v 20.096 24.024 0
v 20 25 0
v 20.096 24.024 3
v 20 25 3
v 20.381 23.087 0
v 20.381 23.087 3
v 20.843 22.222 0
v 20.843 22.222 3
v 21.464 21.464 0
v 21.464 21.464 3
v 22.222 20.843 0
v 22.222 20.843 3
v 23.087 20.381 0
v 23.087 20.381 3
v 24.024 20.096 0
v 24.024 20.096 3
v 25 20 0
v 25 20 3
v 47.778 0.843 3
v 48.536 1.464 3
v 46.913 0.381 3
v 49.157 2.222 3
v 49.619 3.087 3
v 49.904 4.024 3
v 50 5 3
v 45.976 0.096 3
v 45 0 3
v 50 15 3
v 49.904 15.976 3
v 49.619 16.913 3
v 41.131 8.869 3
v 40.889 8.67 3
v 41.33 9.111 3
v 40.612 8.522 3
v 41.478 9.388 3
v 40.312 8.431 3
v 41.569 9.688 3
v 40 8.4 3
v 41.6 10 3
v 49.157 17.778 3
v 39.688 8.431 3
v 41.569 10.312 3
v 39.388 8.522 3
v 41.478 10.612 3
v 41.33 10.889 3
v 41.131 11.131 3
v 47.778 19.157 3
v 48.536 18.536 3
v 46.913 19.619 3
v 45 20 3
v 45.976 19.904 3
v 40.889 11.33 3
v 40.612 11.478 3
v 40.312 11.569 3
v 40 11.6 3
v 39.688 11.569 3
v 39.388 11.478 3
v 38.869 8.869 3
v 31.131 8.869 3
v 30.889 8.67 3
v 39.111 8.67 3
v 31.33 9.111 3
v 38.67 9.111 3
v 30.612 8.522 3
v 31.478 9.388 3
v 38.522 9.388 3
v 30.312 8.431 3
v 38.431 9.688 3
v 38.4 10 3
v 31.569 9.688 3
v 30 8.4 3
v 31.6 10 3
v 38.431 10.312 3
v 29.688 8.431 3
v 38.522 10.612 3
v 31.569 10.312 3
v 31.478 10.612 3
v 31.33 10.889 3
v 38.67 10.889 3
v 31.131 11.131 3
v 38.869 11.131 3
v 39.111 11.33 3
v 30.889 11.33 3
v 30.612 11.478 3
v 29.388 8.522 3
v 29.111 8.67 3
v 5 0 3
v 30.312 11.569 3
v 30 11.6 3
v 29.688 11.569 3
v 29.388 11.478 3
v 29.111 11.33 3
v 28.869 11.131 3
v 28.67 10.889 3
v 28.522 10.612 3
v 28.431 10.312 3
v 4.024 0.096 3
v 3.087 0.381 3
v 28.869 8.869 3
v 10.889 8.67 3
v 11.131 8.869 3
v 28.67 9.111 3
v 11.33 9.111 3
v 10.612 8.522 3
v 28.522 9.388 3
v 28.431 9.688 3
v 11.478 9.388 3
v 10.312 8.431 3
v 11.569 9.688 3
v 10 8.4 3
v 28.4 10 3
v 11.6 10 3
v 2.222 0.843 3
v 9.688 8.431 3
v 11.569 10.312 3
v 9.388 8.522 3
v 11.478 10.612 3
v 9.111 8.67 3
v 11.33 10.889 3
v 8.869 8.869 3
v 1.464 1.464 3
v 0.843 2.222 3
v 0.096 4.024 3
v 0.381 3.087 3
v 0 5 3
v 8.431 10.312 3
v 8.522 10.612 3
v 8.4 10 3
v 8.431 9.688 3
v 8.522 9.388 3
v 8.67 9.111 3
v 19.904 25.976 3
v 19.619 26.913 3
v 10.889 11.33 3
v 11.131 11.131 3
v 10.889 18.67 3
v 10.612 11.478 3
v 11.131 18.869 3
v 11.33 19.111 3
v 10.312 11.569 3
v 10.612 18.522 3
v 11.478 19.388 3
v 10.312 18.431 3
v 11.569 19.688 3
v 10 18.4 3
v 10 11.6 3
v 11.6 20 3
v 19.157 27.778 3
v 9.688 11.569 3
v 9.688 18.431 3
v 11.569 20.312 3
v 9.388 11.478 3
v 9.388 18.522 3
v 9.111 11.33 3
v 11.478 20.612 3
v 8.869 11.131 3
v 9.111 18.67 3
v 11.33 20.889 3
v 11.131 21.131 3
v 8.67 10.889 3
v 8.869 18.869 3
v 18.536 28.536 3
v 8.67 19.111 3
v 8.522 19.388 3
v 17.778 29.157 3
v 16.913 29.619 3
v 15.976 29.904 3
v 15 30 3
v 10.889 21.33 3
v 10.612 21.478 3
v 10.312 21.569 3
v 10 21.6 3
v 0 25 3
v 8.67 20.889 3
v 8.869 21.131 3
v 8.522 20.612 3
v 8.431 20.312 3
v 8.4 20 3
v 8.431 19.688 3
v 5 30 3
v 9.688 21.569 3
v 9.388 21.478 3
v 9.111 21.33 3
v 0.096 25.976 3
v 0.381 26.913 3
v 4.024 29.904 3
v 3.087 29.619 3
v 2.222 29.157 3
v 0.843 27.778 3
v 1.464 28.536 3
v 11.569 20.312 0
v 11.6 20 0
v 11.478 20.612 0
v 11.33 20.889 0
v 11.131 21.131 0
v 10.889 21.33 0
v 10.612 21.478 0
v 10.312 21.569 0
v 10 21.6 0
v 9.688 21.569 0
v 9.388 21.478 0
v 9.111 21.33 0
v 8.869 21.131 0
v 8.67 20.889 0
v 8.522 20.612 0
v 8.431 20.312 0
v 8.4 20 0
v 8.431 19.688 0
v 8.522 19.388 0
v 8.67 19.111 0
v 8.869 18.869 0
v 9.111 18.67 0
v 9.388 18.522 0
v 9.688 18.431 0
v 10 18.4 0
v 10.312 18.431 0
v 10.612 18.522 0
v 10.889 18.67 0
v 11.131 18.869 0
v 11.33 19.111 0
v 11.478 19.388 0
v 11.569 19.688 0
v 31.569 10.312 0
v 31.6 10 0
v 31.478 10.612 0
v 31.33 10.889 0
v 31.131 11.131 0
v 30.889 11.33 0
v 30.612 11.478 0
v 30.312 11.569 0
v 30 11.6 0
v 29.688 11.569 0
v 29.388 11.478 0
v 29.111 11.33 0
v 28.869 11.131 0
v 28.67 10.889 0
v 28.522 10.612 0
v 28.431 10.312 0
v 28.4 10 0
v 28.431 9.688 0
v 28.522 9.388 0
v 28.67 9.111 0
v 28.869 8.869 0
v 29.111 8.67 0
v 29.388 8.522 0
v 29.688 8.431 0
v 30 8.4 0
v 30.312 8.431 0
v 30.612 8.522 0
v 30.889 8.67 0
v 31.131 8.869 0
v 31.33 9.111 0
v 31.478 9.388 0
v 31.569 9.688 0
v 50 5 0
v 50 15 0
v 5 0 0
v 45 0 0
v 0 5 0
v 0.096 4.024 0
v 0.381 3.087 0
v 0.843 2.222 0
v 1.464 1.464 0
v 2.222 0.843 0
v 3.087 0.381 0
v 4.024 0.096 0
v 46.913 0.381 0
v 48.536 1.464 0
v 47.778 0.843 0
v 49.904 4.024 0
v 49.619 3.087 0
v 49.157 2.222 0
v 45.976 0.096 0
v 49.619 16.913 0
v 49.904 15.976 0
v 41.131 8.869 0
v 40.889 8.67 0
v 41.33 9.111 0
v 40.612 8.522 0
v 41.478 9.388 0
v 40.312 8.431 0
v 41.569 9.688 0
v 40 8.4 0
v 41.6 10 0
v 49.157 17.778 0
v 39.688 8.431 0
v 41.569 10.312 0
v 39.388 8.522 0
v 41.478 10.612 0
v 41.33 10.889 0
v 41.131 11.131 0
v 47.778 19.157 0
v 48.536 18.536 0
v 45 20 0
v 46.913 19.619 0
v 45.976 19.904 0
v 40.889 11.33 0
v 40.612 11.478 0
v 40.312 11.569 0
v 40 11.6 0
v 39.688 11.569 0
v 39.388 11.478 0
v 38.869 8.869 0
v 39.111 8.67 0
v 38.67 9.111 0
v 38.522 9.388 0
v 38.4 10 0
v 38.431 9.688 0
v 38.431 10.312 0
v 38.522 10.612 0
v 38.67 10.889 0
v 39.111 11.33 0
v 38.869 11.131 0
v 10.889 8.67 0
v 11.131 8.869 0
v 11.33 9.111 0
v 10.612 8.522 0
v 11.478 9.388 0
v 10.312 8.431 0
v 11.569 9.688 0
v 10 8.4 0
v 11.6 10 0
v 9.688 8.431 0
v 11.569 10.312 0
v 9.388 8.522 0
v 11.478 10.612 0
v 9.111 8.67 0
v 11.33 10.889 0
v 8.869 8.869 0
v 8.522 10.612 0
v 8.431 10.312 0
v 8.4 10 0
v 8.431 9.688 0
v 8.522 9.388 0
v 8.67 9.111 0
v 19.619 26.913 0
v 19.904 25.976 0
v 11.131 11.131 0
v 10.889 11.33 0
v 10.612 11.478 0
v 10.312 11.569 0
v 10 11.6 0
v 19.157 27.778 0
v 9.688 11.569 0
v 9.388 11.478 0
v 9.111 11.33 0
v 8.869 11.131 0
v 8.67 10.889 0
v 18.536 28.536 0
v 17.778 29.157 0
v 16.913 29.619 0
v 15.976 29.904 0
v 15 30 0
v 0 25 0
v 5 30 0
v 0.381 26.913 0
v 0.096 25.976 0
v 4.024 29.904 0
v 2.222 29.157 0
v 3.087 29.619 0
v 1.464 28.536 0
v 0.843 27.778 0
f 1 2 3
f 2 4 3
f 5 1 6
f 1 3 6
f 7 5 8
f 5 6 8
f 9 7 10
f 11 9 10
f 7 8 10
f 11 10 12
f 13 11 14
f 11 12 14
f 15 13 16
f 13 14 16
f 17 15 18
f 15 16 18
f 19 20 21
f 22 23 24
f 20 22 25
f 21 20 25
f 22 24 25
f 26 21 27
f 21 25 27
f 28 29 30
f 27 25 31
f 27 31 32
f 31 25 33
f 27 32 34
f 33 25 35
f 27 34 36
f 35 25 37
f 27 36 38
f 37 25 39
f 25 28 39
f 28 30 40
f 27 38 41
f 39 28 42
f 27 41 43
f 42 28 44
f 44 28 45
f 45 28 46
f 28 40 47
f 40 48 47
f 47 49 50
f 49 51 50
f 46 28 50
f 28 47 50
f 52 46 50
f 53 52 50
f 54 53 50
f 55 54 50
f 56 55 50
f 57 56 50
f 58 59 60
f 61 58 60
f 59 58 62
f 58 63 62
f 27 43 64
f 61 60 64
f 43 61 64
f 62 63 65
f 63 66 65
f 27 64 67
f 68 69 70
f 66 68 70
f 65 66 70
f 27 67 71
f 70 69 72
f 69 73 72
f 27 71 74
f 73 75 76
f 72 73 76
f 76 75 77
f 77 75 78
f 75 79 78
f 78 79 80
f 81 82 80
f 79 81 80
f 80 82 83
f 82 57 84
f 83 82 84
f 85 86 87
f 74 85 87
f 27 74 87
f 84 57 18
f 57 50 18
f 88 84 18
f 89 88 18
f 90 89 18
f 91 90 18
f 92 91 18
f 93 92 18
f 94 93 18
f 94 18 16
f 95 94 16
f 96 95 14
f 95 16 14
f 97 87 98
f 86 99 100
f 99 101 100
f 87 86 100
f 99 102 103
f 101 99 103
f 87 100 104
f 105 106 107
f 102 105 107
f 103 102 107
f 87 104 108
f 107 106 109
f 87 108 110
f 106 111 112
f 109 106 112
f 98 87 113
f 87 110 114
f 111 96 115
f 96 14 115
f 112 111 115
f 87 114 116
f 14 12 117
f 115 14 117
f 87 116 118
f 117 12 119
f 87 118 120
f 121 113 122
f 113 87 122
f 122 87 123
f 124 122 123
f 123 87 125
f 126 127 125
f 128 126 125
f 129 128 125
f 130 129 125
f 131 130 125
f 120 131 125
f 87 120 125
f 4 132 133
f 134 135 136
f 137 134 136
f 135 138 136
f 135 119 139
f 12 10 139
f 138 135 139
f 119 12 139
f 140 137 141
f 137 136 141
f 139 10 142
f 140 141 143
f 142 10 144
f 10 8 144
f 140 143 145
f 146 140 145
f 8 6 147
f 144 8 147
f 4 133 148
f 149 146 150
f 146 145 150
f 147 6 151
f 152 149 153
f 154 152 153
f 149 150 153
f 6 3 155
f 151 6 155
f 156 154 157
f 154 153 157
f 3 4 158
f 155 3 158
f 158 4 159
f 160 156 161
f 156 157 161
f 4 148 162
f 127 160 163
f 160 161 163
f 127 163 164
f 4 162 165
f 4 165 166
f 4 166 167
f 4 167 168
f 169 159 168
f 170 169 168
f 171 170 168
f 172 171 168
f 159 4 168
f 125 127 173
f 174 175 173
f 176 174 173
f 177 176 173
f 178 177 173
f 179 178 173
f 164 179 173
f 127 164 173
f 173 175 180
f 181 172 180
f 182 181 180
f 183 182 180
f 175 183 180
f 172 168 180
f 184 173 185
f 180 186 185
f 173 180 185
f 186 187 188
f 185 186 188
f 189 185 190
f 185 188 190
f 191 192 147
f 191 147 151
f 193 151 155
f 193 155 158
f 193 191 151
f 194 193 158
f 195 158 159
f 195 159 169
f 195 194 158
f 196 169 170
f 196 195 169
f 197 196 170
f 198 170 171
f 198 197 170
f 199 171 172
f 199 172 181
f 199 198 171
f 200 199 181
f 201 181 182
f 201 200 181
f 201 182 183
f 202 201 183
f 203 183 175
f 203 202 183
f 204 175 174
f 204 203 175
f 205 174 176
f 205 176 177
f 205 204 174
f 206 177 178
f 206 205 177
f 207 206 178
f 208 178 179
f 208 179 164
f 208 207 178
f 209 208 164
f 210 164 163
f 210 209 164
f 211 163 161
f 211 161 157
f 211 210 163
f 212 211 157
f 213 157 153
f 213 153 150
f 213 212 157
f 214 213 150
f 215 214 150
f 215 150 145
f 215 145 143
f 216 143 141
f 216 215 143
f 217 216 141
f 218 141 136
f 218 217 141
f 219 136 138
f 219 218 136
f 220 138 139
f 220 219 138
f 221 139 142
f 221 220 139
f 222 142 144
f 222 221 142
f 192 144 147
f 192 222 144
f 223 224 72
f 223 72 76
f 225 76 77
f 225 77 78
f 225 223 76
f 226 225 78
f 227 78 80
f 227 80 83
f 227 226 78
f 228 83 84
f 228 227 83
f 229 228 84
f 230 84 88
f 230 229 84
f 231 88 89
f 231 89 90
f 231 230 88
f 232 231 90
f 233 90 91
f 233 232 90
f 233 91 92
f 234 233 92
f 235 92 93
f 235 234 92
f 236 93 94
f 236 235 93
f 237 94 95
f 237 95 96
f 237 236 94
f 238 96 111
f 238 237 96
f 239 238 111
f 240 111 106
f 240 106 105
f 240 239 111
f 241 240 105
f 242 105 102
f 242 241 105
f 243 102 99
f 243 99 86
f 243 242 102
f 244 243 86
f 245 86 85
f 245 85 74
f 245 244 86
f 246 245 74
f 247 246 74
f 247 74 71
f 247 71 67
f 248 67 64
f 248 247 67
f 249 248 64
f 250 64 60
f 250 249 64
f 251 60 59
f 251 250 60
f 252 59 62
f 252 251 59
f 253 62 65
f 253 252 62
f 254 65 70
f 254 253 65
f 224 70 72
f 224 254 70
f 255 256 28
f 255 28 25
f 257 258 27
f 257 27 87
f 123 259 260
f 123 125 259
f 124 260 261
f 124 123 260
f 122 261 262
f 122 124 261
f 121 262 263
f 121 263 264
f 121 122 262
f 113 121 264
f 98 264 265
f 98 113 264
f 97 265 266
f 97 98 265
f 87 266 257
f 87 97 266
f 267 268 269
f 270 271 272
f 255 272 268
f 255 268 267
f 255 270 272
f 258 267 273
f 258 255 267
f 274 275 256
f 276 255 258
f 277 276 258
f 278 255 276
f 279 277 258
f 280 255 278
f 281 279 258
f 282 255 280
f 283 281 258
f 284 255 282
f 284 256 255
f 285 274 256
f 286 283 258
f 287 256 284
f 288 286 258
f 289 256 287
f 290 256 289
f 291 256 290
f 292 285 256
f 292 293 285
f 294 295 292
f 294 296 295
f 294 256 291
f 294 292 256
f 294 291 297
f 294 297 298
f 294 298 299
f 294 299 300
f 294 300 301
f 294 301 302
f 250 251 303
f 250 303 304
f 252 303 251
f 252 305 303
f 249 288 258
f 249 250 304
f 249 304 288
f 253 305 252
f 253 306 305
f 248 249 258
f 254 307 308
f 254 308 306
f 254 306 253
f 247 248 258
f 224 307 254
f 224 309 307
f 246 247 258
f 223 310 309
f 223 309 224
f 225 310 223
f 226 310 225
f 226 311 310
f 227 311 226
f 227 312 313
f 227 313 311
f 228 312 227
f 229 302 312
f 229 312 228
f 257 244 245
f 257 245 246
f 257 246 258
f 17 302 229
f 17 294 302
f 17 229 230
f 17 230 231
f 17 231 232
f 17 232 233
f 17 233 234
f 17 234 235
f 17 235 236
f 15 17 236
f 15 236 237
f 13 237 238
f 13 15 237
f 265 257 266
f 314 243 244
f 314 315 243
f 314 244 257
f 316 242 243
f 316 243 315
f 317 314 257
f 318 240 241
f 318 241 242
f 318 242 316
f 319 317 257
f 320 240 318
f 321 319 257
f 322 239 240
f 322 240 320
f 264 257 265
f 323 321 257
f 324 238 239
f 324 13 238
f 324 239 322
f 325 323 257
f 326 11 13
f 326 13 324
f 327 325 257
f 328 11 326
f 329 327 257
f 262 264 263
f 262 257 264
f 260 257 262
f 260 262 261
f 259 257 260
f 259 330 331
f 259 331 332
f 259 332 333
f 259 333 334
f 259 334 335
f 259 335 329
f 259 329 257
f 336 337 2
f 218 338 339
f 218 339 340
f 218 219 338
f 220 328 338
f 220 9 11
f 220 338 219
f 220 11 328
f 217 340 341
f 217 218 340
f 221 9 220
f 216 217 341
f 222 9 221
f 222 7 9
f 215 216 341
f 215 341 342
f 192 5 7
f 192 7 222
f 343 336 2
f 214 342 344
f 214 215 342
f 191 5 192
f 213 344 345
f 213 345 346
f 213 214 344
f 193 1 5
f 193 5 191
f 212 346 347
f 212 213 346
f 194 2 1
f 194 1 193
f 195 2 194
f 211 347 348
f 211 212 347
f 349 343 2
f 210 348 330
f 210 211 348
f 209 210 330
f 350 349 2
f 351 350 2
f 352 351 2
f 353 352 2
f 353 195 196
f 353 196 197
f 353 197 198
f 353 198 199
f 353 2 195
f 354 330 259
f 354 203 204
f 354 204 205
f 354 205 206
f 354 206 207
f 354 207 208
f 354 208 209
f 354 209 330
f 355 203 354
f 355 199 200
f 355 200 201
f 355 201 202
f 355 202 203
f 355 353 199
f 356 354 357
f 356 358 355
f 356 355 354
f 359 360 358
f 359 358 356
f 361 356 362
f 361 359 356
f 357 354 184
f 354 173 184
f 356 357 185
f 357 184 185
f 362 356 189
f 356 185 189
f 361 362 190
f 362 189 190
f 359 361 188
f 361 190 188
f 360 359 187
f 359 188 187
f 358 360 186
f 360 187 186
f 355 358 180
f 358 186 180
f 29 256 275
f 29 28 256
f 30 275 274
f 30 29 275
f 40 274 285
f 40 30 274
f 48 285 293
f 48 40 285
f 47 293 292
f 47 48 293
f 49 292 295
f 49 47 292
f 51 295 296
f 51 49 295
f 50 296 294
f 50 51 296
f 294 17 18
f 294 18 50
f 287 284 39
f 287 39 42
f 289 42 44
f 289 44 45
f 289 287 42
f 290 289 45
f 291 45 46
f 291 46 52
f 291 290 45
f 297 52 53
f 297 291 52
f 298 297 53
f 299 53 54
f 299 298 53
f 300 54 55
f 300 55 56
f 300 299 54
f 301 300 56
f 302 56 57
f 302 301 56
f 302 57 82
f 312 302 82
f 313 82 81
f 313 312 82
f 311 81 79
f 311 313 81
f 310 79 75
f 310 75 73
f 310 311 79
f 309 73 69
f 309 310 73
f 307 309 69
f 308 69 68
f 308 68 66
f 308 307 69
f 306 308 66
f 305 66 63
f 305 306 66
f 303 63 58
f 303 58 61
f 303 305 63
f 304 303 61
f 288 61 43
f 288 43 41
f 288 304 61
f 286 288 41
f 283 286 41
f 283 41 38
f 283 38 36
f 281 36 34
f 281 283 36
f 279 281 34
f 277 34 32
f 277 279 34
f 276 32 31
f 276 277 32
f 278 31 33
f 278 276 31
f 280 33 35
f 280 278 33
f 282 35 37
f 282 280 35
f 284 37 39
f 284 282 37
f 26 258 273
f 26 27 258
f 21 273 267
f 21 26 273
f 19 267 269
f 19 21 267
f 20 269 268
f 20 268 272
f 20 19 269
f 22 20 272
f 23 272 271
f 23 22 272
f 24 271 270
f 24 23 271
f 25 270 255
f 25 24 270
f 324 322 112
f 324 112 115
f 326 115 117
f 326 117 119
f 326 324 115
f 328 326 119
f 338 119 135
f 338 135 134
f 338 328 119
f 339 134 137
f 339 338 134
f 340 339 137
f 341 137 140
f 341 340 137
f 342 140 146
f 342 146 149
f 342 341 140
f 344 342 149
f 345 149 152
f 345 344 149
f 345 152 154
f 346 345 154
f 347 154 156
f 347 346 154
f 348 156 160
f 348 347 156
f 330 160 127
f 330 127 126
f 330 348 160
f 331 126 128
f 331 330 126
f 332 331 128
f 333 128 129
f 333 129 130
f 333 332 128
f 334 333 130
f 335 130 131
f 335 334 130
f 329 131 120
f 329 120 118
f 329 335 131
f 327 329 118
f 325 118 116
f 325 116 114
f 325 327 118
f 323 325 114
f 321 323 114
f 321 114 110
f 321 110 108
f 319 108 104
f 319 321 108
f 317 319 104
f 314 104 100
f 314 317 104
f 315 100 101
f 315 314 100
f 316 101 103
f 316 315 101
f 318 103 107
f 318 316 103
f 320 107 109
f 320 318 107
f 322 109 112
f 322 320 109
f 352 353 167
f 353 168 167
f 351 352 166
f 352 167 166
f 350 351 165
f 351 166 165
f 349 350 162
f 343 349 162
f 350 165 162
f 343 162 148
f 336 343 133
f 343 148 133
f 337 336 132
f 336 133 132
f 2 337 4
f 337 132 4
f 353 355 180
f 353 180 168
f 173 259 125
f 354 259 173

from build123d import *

# Parameters (mm, degrees)
SKETCH_1_R      = 1.6
EXTRUDE_1_DEPTH = 3
FILLET_1_R      = 5


with BuildPart() as part:
    # 草图1 → 凸台-拉伸1 (new body)
    with BuildSketch(Plane.XY):
        Polygon((0, 0), (0, 30), (20, 30), (20, 20), (50, 20), (50, 0), align=None)
        with Locations((10, 20)):
            Circle(SKETCH_1_R, mode=Mode.SUBTRACT)
        with Locations((10, 10)):
            Circle(SKETCH_1_R, mode=Mode.SUBTRACT)
        with Locations((30, 10)):
            Circle(SKETCH_1_R, mode=Mode.SUBTRACT)
        with Locations((40, 10)):
            Circle(SKETCH_1_R, mode=Mode.SUBTRACT)
    extrude(amount=EXTRUDE_1_DEPTH)

    # 圆角1
    fillet_1_edges = [part.edges().sort_by_distance(p)[0] for p in [
        (0, 0, 1.5),
        (50, 0, 1.5),
        (50, 20, 1.5),
        (20, 20, 1.5),
        (20, 30, 1.5),
        (0, 30, 1.5),
    ]]
    fillet(fillet_1_edges, radius=FILLET_1_R - 0.0001)  # a hair under: the kernel refuses the full size


solid = part.part
